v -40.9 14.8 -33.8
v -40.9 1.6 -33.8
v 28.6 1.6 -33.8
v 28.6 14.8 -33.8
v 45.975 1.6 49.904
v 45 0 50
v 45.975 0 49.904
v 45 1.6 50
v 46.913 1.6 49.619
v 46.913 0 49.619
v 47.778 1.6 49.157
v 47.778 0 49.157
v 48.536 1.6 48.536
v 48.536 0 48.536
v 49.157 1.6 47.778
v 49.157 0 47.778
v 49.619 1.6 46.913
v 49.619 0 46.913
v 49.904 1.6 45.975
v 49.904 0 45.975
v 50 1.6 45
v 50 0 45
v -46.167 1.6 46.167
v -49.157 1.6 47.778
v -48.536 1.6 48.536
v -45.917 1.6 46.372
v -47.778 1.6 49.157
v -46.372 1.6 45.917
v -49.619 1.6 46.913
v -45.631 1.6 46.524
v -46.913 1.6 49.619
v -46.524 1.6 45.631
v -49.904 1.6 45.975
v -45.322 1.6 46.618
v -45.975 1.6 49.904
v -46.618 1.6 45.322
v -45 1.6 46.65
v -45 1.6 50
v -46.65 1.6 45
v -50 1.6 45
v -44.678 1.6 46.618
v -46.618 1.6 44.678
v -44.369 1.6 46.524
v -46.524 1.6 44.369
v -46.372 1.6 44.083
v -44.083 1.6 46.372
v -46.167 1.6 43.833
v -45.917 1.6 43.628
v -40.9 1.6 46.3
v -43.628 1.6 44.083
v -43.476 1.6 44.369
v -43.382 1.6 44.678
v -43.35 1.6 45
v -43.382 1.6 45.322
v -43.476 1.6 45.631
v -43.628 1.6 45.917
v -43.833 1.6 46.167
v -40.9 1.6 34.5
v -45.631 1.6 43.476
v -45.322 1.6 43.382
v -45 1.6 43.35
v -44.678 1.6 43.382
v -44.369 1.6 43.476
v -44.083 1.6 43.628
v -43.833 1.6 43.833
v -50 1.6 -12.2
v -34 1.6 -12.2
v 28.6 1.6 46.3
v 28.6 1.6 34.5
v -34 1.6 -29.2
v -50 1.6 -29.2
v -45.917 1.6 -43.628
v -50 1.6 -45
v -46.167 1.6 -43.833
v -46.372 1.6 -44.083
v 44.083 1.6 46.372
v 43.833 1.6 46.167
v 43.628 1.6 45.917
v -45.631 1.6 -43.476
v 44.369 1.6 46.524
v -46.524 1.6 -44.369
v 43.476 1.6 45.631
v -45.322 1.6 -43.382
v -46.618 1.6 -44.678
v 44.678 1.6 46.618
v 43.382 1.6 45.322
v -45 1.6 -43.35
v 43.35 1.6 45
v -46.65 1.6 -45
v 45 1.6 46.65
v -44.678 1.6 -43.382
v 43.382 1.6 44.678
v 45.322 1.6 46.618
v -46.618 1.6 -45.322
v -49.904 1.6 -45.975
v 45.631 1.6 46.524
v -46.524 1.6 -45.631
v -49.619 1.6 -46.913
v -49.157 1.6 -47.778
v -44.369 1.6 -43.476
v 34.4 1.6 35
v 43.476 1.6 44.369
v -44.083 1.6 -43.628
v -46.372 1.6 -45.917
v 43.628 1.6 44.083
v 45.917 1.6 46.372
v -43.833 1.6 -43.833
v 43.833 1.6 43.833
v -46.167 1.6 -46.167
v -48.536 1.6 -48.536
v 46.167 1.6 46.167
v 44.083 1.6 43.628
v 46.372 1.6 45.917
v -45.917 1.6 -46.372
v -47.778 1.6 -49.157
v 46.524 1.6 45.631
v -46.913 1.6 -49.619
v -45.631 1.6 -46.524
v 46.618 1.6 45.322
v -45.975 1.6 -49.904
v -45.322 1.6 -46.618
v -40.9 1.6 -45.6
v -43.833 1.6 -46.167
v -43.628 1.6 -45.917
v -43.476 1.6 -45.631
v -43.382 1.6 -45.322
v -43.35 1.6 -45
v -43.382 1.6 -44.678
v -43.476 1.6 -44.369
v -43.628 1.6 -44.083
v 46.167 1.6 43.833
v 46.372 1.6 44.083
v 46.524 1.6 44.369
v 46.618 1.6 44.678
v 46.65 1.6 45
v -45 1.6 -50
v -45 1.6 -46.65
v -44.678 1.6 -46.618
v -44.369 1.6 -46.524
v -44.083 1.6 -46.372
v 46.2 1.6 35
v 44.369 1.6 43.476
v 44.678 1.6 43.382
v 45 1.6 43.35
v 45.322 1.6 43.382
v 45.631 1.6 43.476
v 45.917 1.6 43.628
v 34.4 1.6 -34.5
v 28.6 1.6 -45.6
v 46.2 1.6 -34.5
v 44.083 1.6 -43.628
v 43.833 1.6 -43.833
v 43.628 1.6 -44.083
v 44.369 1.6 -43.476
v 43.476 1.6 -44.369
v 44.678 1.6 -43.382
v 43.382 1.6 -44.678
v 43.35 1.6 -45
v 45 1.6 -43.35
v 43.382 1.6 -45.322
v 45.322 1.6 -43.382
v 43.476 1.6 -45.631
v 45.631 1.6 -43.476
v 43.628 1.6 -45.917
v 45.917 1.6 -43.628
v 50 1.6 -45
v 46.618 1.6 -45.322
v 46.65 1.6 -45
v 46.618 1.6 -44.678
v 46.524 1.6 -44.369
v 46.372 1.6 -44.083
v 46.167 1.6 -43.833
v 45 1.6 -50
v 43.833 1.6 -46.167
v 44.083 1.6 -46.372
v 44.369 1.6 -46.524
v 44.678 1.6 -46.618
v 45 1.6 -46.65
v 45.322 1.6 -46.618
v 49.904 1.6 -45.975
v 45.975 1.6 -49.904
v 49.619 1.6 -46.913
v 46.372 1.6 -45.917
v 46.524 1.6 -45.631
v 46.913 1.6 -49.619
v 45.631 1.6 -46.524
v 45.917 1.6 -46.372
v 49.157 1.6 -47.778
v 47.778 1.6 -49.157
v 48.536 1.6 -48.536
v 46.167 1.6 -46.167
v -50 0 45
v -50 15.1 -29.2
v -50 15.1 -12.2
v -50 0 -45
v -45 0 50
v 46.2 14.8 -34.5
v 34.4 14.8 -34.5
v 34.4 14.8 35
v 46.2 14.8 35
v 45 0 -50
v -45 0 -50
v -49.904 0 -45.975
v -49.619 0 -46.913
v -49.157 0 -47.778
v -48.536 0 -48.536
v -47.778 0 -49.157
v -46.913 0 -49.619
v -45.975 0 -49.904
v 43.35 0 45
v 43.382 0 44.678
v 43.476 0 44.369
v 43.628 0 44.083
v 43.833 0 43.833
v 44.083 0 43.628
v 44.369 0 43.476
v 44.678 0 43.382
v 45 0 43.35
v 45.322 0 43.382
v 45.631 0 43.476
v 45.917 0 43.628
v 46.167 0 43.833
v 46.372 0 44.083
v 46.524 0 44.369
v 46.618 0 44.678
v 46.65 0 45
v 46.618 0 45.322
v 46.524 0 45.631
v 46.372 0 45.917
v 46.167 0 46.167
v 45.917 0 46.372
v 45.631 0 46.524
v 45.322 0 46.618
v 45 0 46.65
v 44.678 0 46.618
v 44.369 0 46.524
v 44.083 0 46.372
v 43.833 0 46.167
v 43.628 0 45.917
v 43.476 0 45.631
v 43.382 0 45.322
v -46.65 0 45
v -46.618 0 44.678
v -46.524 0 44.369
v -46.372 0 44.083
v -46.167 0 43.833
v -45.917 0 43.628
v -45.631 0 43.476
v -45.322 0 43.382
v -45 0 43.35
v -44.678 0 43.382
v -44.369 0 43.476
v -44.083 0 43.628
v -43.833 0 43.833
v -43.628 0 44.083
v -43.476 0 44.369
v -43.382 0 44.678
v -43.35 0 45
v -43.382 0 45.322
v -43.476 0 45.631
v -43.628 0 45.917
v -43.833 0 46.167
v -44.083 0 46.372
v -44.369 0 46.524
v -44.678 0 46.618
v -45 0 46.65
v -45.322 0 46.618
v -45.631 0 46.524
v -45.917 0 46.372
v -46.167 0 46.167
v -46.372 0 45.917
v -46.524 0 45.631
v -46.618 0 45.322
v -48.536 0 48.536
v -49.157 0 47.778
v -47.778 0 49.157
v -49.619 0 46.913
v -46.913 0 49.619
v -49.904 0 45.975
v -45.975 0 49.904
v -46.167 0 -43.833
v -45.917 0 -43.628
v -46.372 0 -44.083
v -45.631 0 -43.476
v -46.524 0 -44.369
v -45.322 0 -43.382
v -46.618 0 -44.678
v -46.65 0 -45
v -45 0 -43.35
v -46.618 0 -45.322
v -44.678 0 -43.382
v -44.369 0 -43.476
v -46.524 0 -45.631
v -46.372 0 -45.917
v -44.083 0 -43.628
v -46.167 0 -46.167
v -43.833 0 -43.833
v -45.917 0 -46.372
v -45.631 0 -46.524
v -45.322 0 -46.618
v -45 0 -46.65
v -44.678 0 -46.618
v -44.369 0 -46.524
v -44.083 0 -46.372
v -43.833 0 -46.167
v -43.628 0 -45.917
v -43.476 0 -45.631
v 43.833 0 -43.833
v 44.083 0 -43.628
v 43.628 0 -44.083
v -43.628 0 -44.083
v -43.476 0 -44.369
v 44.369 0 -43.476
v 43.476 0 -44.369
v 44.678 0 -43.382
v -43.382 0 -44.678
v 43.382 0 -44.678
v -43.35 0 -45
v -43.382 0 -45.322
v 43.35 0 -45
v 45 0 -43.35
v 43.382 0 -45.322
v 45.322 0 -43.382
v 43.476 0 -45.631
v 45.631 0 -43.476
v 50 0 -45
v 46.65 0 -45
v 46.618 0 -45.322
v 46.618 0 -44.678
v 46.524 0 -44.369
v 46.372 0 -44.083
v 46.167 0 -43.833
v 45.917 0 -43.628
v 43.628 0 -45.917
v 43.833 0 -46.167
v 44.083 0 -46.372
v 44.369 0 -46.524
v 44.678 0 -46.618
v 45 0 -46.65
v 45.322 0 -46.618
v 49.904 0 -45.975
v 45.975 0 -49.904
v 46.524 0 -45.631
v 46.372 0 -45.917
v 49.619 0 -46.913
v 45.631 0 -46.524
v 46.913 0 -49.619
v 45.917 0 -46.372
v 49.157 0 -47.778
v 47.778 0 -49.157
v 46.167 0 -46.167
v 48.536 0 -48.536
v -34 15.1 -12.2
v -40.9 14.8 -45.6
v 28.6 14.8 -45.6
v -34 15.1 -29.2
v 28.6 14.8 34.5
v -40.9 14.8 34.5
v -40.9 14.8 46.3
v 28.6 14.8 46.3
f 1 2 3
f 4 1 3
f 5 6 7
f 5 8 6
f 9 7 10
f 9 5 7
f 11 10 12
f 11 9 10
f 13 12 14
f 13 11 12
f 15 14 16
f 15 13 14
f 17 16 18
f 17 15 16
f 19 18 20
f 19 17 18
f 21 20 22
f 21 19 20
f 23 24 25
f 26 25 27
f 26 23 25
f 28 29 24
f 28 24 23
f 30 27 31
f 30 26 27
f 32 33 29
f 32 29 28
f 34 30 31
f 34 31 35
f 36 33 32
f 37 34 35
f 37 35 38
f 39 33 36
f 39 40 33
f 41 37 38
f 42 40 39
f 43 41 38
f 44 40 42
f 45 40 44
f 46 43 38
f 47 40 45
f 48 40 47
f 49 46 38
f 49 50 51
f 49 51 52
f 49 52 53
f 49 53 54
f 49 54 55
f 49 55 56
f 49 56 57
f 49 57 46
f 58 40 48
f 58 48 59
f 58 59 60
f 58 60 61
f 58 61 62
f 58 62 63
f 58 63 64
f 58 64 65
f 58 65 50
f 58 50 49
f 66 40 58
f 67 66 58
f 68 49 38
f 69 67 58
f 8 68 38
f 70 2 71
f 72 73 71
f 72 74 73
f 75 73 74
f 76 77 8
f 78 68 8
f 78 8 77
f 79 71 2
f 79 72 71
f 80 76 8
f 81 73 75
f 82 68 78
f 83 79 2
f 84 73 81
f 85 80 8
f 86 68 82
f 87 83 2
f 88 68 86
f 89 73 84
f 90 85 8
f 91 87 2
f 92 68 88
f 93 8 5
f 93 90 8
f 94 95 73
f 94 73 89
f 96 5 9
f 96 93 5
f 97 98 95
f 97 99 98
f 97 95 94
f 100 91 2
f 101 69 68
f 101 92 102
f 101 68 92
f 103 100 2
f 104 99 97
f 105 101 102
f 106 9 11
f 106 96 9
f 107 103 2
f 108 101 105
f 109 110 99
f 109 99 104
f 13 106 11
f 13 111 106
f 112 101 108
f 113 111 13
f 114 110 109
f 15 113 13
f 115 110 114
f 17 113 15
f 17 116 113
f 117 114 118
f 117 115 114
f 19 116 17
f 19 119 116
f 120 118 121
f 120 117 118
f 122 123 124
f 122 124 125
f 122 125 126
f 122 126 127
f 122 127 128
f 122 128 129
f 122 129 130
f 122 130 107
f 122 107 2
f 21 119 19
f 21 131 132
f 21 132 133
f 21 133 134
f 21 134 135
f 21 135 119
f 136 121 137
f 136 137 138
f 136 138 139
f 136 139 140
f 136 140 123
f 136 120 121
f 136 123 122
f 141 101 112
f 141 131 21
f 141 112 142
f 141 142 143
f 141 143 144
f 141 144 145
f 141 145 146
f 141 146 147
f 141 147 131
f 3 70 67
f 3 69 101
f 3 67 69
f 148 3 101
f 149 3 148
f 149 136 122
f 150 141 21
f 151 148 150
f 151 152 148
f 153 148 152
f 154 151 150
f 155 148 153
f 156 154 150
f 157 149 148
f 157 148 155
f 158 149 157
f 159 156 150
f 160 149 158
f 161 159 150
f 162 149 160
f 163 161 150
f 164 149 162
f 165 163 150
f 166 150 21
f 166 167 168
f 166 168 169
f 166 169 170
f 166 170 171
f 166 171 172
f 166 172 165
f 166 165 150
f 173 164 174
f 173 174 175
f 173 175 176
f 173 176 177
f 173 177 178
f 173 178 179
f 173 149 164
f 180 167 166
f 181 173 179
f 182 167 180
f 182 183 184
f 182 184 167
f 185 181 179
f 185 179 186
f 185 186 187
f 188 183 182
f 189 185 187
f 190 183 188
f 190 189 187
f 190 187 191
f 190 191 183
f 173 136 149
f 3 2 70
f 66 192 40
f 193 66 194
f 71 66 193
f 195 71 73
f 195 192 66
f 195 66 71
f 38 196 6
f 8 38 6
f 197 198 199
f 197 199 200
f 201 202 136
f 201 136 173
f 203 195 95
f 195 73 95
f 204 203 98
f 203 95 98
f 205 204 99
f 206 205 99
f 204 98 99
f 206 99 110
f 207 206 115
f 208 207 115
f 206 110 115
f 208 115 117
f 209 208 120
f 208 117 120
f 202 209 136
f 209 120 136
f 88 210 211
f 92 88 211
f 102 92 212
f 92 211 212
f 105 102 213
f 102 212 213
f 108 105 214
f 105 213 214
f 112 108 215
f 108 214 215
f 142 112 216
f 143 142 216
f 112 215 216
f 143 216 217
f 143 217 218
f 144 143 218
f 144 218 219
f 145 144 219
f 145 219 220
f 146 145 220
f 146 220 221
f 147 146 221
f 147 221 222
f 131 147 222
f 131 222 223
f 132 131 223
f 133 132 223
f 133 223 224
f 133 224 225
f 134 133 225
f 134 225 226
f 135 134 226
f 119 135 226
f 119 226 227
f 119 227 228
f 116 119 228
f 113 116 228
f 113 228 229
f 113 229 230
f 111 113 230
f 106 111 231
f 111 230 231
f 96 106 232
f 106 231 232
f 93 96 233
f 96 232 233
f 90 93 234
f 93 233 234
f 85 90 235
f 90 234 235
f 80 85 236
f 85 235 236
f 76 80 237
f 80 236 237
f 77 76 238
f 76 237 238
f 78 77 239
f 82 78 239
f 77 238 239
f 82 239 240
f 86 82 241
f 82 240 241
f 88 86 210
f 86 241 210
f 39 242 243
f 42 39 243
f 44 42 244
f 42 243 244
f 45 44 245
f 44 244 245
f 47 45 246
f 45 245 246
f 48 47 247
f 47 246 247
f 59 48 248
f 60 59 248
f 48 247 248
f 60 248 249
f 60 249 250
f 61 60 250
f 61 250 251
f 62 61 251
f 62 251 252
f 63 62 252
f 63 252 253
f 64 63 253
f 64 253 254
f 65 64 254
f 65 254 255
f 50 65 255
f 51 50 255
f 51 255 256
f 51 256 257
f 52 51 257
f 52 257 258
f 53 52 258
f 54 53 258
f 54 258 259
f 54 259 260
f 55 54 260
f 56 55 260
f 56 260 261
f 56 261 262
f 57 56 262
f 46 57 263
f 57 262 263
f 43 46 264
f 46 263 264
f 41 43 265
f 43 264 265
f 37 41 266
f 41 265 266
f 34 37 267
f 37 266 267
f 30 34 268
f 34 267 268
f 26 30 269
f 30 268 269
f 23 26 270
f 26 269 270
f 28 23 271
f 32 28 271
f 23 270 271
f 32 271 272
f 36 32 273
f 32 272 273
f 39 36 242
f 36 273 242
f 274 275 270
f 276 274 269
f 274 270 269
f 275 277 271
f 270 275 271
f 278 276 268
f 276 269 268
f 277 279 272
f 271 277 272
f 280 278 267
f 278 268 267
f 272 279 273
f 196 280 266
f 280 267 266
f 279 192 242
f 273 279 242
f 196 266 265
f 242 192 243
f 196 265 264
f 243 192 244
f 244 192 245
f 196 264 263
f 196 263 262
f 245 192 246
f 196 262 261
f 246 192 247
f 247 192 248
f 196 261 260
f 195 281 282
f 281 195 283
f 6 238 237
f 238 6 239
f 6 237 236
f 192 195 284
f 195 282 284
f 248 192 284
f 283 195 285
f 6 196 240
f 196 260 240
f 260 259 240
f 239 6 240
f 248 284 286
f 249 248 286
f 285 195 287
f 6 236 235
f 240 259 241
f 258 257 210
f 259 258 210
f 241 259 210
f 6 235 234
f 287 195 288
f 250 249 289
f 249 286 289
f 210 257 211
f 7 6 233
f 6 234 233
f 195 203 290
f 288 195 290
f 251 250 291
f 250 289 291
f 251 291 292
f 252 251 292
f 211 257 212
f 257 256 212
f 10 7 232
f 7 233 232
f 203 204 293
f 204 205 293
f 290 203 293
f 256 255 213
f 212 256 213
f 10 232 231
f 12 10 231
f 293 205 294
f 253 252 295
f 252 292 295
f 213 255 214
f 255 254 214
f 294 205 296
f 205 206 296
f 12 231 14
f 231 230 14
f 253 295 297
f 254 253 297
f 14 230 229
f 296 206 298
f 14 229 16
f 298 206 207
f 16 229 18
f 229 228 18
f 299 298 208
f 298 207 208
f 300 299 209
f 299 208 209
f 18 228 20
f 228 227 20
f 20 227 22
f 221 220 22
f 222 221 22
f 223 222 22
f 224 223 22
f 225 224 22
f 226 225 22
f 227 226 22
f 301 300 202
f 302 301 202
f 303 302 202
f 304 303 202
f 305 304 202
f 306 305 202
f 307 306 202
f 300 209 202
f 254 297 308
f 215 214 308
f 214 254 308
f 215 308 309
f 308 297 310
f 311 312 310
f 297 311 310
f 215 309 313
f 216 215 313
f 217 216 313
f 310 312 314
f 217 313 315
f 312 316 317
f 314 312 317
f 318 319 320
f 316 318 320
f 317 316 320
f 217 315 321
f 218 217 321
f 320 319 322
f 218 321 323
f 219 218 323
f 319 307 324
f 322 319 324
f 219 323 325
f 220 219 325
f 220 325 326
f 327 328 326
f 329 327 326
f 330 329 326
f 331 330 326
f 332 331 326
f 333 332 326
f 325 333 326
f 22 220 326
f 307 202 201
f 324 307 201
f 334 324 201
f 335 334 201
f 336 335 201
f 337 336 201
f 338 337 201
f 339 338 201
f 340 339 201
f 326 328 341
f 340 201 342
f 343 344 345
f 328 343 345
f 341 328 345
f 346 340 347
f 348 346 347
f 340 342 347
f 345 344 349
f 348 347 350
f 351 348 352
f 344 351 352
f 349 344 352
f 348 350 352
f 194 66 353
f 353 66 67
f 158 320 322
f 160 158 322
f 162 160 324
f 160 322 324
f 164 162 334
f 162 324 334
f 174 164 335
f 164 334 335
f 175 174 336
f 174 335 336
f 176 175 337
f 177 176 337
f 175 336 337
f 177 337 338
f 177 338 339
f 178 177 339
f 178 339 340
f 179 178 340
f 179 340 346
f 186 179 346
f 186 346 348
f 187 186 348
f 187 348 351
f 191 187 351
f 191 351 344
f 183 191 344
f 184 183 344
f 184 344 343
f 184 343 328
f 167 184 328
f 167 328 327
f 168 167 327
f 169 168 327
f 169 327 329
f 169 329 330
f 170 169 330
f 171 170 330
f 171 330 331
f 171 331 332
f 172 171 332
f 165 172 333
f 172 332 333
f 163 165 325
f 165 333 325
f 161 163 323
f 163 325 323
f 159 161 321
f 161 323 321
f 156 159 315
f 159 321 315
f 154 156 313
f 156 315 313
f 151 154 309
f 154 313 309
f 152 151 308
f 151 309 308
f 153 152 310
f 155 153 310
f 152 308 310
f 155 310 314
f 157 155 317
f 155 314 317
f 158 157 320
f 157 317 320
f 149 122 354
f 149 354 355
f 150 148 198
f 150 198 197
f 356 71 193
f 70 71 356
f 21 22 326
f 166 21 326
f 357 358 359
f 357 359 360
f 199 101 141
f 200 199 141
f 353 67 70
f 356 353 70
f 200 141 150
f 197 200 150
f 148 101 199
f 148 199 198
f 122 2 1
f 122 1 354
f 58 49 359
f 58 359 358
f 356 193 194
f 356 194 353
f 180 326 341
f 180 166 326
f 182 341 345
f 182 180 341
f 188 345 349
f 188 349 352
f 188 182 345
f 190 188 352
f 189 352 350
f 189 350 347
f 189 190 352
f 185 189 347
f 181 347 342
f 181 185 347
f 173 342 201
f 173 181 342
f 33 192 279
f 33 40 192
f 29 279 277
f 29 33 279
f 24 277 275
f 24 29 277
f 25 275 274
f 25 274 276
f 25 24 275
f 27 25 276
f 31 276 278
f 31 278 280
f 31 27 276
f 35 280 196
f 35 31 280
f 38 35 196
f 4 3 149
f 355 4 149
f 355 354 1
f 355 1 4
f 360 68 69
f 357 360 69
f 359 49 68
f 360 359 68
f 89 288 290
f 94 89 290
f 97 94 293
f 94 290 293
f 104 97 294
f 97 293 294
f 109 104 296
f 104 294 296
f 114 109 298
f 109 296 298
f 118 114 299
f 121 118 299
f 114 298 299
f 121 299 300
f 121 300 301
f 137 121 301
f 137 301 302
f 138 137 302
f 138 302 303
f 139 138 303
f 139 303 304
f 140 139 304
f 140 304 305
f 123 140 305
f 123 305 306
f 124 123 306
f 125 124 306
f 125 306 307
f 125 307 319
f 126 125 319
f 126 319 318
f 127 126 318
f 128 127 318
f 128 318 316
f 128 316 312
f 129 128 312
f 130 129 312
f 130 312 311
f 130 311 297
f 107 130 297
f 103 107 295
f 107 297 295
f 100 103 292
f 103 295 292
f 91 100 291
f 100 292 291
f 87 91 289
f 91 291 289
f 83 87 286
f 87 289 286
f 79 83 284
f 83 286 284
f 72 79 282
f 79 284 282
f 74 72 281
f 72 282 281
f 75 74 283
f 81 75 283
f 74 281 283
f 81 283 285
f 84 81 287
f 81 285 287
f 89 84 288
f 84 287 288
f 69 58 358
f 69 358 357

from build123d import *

# Parameters (mm, degrees)
SKETCH1_W                  = 100
SKETCH1_H                  = 100
BOSS_EXTRUDE1_DEPTH        = 1.6
FILLET1_R                  = 5
F_3_3_3_3_DIAMETER_HOLE1_D = 3.3
SKETCH4_W                  = 16
SKETCH4_H                  = 17
BOSS_EXTRUDE2_DEPTH        = 13.5
SKETCH5_W                  = 69.5
SKETCH5_H                  = 11.8
SKETCH5_W_2                = 11.8
SKETCH5_H_2                = 69.5
BOSS_EXTRUDE3_DEPTH        = 13.2


with BuildPart() as part:
    # Sketch1 → Boss-Extrude1 (new body)
    with BuildSketch(Plane(origin=(0, 0, 0), x_dir=(1, 0, 0), z_dir=(0, 1, 0))):
        Rectangle(SKETCH1_W, SKETCH1_H)
    extrude(amount=BOSS_EXTRUDE1_DEPTH)

    # Fillet1
    fillet1_edges = [part.edges().sort_by_distance(p)[0] for p in [
        (50, 0.8, 50),
        (-50, 0.8, 50),
        (-50, 0.8, -50),
        (50, 0.8, -50),
    ]]
    fillet(fillet1_edges, radius=FILLET1_R)

    # Ø3.3 (3.3) Diameter Hole1 (through all)
    with Locations(Plane(origin=(0, 1.6, 0), x_dir=(1, 0, 0), z_dir=(0, 1, 0))):
        with Locations((45, -45), (-45, -45), (-45, 45), (45, 45)):
            Hole(F_3_3_3_3_DIAMETER_HOLE1_D / 2)

    # Sketch4 → Boss-Extrude2 (add)
    with BuildSketch(Plane(origin=(0, 1.6, 0), x_dir=(1, 0, 0), z_dir=(0, 1, 0))):
        with Locations((-42, 20.7)):
            Rectangle(SKETCH4_W, SKETCH4_H)
    extrude(amount=BOSS_EXTRUDE2_DEPTH)

    # Sketch5 → Boss-Extrude3 (add)
    with BuildSketch(Plane(origin=(0, 1.6, 0), x_dir=(1, 0, 0), z_dir=(0, 1, 0))):
        with Locations((-6.15, 39.7)):
            Rectangle(SKETCH5_W, SKETCH5_H)
        with Locations((40.3, -0.25)):
            Rectangle(SKETCH5_W_2, SKETCH5_H_2)
        with Locations((-6.15, -40.4)):
            Rectangle(SKETCH5_W, SKETCH5_H)
    extrude(amount=BOSS_EXTRUDE3_DEPTH)


solid = part.part
